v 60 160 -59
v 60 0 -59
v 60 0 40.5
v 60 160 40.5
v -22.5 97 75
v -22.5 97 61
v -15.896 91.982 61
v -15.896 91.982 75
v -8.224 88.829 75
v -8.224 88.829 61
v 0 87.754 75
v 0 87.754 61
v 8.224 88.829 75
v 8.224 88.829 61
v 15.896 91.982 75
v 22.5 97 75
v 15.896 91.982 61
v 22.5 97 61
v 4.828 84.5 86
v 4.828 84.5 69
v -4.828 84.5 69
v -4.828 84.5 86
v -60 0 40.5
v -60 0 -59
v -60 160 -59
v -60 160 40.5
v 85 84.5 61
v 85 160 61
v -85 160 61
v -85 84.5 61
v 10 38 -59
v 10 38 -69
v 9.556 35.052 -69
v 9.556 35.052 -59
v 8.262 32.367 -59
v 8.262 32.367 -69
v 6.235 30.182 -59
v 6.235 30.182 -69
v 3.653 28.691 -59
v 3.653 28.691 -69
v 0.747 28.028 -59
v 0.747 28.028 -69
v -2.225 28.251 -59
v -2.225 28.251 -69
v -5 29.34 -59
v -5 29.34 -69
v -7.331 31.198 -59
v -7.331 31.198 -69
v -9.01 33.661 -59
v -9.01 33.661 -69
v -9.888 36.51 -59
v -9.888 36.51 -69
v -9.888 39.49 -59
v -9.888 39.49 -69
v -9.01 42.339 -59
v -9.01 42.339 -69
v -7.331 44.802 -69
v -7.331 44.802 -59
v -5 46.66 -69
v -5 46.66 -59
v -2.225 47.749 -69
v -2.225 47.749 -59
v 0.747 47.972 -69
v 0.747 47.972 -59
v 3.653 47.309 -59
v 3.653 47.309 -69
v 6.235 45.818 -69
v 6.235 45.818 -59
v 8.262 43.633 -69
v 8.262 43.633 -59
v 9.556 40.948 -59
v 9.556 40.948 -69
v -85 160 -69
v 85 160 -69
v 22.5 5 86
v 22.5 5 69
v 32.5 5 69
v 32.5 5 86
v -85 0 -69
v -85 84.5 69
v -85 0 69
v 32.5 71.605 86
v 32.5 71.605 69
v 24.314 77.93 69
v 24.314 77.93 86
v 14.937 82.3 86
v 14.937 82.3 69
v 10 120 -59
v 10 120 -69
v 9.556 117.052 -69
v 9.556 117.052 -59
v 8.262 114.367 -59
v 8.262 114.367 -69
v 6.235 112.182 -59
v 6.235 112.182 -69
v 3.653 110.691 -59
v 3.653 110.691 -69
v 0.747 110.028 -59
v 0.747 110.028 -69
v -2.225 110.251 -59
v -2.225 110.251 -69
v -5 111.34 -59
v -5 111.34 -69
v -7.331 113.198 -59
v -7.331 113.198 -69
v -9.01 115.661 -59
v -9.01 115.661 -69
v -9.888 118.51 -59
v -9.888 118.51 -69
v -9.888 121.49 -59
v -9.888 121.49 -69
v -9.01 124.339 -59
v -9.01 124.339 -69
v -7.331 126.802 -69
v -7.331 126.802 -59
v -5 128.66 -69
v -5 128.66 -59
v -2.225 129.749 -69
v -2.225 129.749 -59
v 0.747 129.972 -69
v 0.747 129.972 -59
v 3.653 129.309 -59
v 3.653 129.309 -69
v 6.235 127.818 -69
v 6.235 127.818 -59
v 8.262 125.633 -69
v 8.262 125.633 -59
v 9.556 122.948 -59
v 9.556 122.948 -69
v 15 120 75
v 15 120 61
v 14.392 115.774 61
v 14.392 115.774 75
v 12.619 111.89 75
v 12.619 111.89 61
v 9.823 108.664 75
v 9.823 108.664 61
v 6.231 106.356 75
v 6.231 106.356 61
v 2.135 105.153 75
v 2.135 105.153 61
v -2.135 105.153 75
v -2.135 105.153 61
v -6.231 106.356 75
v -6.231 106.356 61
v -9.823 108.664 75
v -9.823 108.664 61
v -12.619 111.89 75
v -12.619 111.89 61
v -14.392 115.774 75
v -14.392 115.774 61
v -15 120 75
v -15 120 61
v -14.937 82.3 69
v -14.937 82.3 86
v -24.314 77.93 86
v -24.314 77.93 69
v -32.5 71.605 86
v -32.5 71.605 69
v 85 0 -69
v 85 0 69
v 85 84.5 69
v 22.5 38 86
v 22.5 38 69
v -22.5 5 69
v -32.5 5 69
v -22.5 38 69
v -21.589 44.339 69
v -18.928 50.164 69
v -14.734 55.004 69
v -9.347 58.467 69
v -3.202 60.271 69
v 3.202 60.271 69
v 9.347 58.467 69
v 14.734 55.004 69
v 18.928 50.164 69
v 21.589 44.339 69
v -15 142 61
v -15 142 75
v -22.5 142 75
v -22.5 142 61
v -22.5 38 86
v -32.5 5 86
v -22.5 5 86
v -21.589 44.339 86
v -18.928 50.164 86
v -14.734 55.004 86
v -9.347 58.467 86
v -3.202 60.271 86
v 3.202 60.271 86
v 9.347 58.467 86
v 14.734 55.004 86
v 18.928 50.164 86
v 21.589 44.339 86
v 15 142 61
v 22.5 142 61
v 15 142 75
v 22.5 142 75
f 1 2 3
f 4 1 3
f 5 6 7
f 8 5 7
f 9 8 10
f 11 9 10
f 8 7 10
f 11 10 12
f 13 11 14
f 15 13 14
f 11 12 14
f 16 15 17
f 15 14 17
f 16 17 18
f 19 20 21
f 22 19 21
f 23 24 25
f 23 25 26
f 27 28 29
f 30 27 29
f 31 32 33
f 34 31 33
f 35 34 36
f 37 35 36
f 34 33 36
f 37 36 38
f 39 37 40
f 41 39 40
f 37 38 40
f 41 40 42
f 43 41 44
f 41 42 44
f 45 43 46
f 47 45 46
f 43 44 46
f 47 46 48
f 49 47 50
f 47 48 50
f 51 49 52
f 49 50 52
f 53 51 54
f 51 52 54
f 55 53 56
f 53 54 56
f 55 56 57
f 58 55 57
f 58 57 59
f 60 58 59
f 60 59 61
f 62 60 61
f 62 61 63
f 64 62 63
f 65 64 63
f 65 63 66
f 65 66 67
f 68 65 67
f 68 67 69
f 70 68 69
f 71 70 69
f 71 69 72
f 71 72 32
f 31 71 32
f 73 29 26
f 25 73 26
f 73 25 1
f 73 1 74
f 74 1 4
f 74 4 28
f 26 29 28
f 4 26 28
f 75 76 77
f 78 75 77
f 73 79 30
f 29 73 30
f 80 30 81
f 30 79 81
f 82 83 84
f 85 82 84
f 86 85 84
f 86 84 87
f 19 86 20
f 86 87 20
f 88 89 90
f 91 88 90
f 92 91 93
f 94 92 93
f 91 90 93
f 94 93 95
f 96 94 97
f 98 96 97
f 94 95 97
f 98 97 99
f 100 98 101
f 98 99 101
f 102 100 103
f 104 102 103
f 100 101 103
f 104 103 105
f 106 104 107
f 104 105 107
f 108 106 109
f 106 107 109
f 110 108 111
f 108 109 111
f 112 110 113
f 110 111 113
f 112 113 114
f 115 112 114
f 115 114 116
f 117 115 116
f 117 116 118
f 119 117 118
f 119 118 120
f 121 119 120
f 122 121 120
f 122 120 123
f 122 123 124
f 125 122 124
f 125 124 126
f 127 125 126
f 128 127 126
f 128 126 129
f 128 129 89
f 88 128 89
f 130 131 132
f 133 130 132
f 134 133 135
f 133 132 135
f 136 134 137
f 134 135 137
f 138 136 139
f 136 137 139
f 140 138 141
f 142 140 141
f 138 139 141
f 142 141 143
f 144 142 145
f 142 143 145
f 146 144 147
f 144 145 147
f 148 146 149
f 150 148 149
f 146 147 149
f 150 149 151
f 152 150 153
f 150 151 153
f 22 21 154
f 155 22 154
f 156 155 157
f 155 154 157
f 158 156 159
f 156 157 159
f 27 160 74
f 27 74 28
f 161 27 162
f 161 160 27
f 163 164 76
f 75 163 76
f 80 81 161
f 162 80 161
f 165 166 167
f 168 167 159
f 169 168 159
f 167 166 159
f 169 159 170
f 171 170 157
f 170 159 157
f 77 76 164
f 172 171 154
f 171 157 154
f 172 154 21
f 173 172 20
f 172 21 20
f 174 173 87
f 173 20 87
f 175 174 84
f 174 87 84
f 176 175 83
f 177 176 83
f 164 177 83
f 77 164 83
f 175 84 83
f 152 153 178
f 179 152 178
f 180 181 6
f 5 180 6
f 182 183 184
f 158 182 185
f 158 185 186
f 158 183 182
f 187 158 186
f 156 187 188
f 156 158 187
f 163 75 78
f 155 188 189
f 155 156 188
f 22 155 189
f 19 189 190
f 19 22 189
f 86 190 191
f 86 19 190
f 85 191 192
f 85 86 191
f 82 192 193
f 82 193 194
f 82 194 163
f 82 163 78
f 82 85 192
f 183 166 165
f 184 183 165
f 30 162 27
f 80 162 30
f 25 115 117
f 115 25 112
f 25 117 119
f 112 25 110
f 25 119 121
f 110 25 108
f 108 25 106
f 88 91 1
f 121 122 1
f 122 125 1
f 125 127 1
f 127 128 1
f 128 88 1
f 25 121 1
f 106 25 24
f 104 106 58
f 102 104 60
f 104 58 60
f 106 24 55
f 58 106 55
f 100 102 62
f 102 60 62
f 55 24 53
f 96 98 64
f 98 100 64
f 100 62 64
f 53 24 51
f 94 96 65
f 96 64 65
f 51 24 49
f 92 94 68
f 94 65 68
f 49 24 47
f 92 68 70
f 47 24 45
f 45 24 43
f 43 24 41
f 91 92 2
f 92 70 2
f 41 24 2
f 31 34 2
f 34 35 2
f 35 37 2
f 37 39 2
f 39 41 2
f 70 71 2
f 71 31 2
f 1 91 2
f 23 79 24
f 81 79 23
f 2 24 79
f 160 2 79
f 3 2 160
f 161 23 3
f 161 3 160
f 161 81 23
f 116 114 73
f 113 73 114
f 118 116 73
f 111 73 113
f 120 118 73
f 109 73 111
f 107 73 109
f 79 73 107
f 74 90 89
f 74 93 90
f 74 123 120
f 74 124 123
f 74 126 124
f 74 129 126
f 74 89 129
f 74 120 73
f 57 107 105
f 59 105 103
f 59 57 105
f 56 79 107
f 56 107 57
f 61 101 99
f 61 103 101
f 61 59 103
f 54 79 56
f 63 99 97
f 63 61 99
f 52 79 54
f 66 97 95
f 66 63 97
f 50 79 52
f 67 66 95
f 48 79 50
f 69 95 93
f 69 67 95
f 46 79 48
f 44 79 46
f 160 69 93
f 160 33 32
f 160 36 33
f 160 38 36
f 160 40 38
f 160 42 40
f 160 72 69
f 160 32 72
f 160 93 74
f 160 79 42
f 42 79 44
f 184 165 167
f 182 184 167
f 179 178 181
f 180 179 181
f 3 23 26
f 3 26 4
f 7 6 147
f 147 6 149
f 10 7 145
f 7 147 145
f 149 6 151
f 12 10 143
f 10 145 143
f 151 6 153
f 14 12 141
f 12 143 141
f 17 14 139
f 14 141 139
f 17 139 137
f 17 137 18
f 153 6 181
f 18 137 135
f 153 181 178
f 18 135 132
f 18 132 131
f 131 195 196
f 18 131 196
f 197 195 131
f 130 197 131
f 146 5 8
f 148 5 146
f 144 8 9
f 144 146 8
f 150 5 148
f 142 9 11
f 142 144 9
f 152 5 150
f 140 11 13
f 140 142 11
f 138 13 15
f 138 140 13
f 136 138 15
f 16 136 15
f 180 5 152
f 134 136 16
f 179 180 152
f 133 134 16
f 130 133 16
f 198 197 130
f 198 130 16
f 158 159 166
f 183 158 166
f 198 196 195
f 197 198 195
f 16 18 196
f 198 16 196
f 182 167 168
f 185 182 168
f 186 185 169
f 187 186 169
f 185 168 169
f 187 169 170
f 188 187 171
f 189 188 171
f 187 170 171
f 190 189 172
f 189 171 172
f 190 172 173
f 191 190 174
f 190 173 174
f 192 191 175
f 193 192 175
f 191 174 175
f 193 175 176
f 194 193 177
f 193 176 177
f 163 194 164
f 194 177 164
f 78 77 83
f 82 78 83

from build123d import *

# Parameters (mm, degrees)
F0_W      = 170
F0_H      = 138
F0_W_2    = 120
F0_H_2    = 99.5
F1_DEPTH  = 160
F2_W      = 170
F2_H      = 8
F3_DEPTH  = 75.5
F4_R      = 10
F5_DEPTH  = 25
F8_DEPTH  = 14
F10_DEPTH = 17


with BuildPart() as f1:
    # F0 (on Front) → F1 (new body)
    with BuildSketch(Plane.XZ):
        Rectangle(F0_W, F0_H)
        with Locations((0, -9.25)):
            Rectangle(F0_W_2, F0_H_2, mode=Mode.SUBTRACT)
    extrude(amount=-F1_DEPTH)

    # F2 (on face) → F3 (cut)
    with BuildSketch(Plane(origin=(0, 160, 0), x_dir=(-1, 0, 0), z_dir=(0, 1, 0))):
        with Locations((0, 65)):
            Rectangle(F2_W, F2_H)
    extrude(amount=-F3_DEPTH, mode=Mode.SUBTRACT)

    # F4 (on face) → F5 (cut)
    with BuildSketch(Plane(origin=(0, 0, -69), x_dir=(1, 0, 0), z_dir=(0, 0, -1))):
        with Locations((0, -120)):
            Circle(F4_R)
        with Locations((0, -38)):
            Circle(F4_R)
    extrude(amount=-F5_DEPTH, mode=Mode.SUBTRACT)


with BuildPart() as f8:
    # F7 (on face) → F8 (new body)
    with BuildSketch(Plane.XY.offset(61)):
        with BuildLine():
            Line((15, 142.000121), (15, 137.655348))
            Line((15, 137.655348), (15, 120))
            ThreePointArc((15, 120), (0, 105), (-15, 120))
            Line((-15, 120), (-15, 142.000121))
            Line((-15, 142.000121), (-22.5, 142.000121))
            Line((-22.5, 142.000121), (-22.5, 120))
            Line((-22.5, 120), (-22.5, 97))
            ThreePointArc((-22.5, 97), (0, 87.754121), (22.5, 97))
            Line((22.5, 97), (22.5, 120))
            Line((22.5, 120), (22.5, 142.000121))
            Line((22.5, 142.000121), (15, 142.000121))
        make_face()
    extrude(amount=F8_DEPTH)


with BuildPart() as f10:
    # F9 (on face) → F10 (new body)
    with BuildSketch(Plane.XY.offset(69)):
        with BuildLine():
            ThreePointArc((-22.5, 38), (0, 60.5), (22.5, 38))
            Line((22.5, 38), (22.5, 5))
            Line((22.5, 5), (32.5, 5))
            Line((32.5, 5), (32.5, 71.605245))
            ThreePointArc((32.5, 71.605245), (19.746372, 80.375031), (4.828302, 84.5))
            Line((4.828302, 84.5), (-4.828302, 84.5))
            ThreePointArc((-4.828302, 84.5), (-19.746372, 80.375031), (-32.5, 71.605245))
            Line((-32.5, 71.605245), (-32.5, 5))
            Line((-32.5, 5), (-22.5, 5))
            Line((-22.5, 5), (-22.5, 38))
        make_face()
    extrude(amount=F10_DEPTH)


solid = Compound([f1.part, f8.part, f10.part])
